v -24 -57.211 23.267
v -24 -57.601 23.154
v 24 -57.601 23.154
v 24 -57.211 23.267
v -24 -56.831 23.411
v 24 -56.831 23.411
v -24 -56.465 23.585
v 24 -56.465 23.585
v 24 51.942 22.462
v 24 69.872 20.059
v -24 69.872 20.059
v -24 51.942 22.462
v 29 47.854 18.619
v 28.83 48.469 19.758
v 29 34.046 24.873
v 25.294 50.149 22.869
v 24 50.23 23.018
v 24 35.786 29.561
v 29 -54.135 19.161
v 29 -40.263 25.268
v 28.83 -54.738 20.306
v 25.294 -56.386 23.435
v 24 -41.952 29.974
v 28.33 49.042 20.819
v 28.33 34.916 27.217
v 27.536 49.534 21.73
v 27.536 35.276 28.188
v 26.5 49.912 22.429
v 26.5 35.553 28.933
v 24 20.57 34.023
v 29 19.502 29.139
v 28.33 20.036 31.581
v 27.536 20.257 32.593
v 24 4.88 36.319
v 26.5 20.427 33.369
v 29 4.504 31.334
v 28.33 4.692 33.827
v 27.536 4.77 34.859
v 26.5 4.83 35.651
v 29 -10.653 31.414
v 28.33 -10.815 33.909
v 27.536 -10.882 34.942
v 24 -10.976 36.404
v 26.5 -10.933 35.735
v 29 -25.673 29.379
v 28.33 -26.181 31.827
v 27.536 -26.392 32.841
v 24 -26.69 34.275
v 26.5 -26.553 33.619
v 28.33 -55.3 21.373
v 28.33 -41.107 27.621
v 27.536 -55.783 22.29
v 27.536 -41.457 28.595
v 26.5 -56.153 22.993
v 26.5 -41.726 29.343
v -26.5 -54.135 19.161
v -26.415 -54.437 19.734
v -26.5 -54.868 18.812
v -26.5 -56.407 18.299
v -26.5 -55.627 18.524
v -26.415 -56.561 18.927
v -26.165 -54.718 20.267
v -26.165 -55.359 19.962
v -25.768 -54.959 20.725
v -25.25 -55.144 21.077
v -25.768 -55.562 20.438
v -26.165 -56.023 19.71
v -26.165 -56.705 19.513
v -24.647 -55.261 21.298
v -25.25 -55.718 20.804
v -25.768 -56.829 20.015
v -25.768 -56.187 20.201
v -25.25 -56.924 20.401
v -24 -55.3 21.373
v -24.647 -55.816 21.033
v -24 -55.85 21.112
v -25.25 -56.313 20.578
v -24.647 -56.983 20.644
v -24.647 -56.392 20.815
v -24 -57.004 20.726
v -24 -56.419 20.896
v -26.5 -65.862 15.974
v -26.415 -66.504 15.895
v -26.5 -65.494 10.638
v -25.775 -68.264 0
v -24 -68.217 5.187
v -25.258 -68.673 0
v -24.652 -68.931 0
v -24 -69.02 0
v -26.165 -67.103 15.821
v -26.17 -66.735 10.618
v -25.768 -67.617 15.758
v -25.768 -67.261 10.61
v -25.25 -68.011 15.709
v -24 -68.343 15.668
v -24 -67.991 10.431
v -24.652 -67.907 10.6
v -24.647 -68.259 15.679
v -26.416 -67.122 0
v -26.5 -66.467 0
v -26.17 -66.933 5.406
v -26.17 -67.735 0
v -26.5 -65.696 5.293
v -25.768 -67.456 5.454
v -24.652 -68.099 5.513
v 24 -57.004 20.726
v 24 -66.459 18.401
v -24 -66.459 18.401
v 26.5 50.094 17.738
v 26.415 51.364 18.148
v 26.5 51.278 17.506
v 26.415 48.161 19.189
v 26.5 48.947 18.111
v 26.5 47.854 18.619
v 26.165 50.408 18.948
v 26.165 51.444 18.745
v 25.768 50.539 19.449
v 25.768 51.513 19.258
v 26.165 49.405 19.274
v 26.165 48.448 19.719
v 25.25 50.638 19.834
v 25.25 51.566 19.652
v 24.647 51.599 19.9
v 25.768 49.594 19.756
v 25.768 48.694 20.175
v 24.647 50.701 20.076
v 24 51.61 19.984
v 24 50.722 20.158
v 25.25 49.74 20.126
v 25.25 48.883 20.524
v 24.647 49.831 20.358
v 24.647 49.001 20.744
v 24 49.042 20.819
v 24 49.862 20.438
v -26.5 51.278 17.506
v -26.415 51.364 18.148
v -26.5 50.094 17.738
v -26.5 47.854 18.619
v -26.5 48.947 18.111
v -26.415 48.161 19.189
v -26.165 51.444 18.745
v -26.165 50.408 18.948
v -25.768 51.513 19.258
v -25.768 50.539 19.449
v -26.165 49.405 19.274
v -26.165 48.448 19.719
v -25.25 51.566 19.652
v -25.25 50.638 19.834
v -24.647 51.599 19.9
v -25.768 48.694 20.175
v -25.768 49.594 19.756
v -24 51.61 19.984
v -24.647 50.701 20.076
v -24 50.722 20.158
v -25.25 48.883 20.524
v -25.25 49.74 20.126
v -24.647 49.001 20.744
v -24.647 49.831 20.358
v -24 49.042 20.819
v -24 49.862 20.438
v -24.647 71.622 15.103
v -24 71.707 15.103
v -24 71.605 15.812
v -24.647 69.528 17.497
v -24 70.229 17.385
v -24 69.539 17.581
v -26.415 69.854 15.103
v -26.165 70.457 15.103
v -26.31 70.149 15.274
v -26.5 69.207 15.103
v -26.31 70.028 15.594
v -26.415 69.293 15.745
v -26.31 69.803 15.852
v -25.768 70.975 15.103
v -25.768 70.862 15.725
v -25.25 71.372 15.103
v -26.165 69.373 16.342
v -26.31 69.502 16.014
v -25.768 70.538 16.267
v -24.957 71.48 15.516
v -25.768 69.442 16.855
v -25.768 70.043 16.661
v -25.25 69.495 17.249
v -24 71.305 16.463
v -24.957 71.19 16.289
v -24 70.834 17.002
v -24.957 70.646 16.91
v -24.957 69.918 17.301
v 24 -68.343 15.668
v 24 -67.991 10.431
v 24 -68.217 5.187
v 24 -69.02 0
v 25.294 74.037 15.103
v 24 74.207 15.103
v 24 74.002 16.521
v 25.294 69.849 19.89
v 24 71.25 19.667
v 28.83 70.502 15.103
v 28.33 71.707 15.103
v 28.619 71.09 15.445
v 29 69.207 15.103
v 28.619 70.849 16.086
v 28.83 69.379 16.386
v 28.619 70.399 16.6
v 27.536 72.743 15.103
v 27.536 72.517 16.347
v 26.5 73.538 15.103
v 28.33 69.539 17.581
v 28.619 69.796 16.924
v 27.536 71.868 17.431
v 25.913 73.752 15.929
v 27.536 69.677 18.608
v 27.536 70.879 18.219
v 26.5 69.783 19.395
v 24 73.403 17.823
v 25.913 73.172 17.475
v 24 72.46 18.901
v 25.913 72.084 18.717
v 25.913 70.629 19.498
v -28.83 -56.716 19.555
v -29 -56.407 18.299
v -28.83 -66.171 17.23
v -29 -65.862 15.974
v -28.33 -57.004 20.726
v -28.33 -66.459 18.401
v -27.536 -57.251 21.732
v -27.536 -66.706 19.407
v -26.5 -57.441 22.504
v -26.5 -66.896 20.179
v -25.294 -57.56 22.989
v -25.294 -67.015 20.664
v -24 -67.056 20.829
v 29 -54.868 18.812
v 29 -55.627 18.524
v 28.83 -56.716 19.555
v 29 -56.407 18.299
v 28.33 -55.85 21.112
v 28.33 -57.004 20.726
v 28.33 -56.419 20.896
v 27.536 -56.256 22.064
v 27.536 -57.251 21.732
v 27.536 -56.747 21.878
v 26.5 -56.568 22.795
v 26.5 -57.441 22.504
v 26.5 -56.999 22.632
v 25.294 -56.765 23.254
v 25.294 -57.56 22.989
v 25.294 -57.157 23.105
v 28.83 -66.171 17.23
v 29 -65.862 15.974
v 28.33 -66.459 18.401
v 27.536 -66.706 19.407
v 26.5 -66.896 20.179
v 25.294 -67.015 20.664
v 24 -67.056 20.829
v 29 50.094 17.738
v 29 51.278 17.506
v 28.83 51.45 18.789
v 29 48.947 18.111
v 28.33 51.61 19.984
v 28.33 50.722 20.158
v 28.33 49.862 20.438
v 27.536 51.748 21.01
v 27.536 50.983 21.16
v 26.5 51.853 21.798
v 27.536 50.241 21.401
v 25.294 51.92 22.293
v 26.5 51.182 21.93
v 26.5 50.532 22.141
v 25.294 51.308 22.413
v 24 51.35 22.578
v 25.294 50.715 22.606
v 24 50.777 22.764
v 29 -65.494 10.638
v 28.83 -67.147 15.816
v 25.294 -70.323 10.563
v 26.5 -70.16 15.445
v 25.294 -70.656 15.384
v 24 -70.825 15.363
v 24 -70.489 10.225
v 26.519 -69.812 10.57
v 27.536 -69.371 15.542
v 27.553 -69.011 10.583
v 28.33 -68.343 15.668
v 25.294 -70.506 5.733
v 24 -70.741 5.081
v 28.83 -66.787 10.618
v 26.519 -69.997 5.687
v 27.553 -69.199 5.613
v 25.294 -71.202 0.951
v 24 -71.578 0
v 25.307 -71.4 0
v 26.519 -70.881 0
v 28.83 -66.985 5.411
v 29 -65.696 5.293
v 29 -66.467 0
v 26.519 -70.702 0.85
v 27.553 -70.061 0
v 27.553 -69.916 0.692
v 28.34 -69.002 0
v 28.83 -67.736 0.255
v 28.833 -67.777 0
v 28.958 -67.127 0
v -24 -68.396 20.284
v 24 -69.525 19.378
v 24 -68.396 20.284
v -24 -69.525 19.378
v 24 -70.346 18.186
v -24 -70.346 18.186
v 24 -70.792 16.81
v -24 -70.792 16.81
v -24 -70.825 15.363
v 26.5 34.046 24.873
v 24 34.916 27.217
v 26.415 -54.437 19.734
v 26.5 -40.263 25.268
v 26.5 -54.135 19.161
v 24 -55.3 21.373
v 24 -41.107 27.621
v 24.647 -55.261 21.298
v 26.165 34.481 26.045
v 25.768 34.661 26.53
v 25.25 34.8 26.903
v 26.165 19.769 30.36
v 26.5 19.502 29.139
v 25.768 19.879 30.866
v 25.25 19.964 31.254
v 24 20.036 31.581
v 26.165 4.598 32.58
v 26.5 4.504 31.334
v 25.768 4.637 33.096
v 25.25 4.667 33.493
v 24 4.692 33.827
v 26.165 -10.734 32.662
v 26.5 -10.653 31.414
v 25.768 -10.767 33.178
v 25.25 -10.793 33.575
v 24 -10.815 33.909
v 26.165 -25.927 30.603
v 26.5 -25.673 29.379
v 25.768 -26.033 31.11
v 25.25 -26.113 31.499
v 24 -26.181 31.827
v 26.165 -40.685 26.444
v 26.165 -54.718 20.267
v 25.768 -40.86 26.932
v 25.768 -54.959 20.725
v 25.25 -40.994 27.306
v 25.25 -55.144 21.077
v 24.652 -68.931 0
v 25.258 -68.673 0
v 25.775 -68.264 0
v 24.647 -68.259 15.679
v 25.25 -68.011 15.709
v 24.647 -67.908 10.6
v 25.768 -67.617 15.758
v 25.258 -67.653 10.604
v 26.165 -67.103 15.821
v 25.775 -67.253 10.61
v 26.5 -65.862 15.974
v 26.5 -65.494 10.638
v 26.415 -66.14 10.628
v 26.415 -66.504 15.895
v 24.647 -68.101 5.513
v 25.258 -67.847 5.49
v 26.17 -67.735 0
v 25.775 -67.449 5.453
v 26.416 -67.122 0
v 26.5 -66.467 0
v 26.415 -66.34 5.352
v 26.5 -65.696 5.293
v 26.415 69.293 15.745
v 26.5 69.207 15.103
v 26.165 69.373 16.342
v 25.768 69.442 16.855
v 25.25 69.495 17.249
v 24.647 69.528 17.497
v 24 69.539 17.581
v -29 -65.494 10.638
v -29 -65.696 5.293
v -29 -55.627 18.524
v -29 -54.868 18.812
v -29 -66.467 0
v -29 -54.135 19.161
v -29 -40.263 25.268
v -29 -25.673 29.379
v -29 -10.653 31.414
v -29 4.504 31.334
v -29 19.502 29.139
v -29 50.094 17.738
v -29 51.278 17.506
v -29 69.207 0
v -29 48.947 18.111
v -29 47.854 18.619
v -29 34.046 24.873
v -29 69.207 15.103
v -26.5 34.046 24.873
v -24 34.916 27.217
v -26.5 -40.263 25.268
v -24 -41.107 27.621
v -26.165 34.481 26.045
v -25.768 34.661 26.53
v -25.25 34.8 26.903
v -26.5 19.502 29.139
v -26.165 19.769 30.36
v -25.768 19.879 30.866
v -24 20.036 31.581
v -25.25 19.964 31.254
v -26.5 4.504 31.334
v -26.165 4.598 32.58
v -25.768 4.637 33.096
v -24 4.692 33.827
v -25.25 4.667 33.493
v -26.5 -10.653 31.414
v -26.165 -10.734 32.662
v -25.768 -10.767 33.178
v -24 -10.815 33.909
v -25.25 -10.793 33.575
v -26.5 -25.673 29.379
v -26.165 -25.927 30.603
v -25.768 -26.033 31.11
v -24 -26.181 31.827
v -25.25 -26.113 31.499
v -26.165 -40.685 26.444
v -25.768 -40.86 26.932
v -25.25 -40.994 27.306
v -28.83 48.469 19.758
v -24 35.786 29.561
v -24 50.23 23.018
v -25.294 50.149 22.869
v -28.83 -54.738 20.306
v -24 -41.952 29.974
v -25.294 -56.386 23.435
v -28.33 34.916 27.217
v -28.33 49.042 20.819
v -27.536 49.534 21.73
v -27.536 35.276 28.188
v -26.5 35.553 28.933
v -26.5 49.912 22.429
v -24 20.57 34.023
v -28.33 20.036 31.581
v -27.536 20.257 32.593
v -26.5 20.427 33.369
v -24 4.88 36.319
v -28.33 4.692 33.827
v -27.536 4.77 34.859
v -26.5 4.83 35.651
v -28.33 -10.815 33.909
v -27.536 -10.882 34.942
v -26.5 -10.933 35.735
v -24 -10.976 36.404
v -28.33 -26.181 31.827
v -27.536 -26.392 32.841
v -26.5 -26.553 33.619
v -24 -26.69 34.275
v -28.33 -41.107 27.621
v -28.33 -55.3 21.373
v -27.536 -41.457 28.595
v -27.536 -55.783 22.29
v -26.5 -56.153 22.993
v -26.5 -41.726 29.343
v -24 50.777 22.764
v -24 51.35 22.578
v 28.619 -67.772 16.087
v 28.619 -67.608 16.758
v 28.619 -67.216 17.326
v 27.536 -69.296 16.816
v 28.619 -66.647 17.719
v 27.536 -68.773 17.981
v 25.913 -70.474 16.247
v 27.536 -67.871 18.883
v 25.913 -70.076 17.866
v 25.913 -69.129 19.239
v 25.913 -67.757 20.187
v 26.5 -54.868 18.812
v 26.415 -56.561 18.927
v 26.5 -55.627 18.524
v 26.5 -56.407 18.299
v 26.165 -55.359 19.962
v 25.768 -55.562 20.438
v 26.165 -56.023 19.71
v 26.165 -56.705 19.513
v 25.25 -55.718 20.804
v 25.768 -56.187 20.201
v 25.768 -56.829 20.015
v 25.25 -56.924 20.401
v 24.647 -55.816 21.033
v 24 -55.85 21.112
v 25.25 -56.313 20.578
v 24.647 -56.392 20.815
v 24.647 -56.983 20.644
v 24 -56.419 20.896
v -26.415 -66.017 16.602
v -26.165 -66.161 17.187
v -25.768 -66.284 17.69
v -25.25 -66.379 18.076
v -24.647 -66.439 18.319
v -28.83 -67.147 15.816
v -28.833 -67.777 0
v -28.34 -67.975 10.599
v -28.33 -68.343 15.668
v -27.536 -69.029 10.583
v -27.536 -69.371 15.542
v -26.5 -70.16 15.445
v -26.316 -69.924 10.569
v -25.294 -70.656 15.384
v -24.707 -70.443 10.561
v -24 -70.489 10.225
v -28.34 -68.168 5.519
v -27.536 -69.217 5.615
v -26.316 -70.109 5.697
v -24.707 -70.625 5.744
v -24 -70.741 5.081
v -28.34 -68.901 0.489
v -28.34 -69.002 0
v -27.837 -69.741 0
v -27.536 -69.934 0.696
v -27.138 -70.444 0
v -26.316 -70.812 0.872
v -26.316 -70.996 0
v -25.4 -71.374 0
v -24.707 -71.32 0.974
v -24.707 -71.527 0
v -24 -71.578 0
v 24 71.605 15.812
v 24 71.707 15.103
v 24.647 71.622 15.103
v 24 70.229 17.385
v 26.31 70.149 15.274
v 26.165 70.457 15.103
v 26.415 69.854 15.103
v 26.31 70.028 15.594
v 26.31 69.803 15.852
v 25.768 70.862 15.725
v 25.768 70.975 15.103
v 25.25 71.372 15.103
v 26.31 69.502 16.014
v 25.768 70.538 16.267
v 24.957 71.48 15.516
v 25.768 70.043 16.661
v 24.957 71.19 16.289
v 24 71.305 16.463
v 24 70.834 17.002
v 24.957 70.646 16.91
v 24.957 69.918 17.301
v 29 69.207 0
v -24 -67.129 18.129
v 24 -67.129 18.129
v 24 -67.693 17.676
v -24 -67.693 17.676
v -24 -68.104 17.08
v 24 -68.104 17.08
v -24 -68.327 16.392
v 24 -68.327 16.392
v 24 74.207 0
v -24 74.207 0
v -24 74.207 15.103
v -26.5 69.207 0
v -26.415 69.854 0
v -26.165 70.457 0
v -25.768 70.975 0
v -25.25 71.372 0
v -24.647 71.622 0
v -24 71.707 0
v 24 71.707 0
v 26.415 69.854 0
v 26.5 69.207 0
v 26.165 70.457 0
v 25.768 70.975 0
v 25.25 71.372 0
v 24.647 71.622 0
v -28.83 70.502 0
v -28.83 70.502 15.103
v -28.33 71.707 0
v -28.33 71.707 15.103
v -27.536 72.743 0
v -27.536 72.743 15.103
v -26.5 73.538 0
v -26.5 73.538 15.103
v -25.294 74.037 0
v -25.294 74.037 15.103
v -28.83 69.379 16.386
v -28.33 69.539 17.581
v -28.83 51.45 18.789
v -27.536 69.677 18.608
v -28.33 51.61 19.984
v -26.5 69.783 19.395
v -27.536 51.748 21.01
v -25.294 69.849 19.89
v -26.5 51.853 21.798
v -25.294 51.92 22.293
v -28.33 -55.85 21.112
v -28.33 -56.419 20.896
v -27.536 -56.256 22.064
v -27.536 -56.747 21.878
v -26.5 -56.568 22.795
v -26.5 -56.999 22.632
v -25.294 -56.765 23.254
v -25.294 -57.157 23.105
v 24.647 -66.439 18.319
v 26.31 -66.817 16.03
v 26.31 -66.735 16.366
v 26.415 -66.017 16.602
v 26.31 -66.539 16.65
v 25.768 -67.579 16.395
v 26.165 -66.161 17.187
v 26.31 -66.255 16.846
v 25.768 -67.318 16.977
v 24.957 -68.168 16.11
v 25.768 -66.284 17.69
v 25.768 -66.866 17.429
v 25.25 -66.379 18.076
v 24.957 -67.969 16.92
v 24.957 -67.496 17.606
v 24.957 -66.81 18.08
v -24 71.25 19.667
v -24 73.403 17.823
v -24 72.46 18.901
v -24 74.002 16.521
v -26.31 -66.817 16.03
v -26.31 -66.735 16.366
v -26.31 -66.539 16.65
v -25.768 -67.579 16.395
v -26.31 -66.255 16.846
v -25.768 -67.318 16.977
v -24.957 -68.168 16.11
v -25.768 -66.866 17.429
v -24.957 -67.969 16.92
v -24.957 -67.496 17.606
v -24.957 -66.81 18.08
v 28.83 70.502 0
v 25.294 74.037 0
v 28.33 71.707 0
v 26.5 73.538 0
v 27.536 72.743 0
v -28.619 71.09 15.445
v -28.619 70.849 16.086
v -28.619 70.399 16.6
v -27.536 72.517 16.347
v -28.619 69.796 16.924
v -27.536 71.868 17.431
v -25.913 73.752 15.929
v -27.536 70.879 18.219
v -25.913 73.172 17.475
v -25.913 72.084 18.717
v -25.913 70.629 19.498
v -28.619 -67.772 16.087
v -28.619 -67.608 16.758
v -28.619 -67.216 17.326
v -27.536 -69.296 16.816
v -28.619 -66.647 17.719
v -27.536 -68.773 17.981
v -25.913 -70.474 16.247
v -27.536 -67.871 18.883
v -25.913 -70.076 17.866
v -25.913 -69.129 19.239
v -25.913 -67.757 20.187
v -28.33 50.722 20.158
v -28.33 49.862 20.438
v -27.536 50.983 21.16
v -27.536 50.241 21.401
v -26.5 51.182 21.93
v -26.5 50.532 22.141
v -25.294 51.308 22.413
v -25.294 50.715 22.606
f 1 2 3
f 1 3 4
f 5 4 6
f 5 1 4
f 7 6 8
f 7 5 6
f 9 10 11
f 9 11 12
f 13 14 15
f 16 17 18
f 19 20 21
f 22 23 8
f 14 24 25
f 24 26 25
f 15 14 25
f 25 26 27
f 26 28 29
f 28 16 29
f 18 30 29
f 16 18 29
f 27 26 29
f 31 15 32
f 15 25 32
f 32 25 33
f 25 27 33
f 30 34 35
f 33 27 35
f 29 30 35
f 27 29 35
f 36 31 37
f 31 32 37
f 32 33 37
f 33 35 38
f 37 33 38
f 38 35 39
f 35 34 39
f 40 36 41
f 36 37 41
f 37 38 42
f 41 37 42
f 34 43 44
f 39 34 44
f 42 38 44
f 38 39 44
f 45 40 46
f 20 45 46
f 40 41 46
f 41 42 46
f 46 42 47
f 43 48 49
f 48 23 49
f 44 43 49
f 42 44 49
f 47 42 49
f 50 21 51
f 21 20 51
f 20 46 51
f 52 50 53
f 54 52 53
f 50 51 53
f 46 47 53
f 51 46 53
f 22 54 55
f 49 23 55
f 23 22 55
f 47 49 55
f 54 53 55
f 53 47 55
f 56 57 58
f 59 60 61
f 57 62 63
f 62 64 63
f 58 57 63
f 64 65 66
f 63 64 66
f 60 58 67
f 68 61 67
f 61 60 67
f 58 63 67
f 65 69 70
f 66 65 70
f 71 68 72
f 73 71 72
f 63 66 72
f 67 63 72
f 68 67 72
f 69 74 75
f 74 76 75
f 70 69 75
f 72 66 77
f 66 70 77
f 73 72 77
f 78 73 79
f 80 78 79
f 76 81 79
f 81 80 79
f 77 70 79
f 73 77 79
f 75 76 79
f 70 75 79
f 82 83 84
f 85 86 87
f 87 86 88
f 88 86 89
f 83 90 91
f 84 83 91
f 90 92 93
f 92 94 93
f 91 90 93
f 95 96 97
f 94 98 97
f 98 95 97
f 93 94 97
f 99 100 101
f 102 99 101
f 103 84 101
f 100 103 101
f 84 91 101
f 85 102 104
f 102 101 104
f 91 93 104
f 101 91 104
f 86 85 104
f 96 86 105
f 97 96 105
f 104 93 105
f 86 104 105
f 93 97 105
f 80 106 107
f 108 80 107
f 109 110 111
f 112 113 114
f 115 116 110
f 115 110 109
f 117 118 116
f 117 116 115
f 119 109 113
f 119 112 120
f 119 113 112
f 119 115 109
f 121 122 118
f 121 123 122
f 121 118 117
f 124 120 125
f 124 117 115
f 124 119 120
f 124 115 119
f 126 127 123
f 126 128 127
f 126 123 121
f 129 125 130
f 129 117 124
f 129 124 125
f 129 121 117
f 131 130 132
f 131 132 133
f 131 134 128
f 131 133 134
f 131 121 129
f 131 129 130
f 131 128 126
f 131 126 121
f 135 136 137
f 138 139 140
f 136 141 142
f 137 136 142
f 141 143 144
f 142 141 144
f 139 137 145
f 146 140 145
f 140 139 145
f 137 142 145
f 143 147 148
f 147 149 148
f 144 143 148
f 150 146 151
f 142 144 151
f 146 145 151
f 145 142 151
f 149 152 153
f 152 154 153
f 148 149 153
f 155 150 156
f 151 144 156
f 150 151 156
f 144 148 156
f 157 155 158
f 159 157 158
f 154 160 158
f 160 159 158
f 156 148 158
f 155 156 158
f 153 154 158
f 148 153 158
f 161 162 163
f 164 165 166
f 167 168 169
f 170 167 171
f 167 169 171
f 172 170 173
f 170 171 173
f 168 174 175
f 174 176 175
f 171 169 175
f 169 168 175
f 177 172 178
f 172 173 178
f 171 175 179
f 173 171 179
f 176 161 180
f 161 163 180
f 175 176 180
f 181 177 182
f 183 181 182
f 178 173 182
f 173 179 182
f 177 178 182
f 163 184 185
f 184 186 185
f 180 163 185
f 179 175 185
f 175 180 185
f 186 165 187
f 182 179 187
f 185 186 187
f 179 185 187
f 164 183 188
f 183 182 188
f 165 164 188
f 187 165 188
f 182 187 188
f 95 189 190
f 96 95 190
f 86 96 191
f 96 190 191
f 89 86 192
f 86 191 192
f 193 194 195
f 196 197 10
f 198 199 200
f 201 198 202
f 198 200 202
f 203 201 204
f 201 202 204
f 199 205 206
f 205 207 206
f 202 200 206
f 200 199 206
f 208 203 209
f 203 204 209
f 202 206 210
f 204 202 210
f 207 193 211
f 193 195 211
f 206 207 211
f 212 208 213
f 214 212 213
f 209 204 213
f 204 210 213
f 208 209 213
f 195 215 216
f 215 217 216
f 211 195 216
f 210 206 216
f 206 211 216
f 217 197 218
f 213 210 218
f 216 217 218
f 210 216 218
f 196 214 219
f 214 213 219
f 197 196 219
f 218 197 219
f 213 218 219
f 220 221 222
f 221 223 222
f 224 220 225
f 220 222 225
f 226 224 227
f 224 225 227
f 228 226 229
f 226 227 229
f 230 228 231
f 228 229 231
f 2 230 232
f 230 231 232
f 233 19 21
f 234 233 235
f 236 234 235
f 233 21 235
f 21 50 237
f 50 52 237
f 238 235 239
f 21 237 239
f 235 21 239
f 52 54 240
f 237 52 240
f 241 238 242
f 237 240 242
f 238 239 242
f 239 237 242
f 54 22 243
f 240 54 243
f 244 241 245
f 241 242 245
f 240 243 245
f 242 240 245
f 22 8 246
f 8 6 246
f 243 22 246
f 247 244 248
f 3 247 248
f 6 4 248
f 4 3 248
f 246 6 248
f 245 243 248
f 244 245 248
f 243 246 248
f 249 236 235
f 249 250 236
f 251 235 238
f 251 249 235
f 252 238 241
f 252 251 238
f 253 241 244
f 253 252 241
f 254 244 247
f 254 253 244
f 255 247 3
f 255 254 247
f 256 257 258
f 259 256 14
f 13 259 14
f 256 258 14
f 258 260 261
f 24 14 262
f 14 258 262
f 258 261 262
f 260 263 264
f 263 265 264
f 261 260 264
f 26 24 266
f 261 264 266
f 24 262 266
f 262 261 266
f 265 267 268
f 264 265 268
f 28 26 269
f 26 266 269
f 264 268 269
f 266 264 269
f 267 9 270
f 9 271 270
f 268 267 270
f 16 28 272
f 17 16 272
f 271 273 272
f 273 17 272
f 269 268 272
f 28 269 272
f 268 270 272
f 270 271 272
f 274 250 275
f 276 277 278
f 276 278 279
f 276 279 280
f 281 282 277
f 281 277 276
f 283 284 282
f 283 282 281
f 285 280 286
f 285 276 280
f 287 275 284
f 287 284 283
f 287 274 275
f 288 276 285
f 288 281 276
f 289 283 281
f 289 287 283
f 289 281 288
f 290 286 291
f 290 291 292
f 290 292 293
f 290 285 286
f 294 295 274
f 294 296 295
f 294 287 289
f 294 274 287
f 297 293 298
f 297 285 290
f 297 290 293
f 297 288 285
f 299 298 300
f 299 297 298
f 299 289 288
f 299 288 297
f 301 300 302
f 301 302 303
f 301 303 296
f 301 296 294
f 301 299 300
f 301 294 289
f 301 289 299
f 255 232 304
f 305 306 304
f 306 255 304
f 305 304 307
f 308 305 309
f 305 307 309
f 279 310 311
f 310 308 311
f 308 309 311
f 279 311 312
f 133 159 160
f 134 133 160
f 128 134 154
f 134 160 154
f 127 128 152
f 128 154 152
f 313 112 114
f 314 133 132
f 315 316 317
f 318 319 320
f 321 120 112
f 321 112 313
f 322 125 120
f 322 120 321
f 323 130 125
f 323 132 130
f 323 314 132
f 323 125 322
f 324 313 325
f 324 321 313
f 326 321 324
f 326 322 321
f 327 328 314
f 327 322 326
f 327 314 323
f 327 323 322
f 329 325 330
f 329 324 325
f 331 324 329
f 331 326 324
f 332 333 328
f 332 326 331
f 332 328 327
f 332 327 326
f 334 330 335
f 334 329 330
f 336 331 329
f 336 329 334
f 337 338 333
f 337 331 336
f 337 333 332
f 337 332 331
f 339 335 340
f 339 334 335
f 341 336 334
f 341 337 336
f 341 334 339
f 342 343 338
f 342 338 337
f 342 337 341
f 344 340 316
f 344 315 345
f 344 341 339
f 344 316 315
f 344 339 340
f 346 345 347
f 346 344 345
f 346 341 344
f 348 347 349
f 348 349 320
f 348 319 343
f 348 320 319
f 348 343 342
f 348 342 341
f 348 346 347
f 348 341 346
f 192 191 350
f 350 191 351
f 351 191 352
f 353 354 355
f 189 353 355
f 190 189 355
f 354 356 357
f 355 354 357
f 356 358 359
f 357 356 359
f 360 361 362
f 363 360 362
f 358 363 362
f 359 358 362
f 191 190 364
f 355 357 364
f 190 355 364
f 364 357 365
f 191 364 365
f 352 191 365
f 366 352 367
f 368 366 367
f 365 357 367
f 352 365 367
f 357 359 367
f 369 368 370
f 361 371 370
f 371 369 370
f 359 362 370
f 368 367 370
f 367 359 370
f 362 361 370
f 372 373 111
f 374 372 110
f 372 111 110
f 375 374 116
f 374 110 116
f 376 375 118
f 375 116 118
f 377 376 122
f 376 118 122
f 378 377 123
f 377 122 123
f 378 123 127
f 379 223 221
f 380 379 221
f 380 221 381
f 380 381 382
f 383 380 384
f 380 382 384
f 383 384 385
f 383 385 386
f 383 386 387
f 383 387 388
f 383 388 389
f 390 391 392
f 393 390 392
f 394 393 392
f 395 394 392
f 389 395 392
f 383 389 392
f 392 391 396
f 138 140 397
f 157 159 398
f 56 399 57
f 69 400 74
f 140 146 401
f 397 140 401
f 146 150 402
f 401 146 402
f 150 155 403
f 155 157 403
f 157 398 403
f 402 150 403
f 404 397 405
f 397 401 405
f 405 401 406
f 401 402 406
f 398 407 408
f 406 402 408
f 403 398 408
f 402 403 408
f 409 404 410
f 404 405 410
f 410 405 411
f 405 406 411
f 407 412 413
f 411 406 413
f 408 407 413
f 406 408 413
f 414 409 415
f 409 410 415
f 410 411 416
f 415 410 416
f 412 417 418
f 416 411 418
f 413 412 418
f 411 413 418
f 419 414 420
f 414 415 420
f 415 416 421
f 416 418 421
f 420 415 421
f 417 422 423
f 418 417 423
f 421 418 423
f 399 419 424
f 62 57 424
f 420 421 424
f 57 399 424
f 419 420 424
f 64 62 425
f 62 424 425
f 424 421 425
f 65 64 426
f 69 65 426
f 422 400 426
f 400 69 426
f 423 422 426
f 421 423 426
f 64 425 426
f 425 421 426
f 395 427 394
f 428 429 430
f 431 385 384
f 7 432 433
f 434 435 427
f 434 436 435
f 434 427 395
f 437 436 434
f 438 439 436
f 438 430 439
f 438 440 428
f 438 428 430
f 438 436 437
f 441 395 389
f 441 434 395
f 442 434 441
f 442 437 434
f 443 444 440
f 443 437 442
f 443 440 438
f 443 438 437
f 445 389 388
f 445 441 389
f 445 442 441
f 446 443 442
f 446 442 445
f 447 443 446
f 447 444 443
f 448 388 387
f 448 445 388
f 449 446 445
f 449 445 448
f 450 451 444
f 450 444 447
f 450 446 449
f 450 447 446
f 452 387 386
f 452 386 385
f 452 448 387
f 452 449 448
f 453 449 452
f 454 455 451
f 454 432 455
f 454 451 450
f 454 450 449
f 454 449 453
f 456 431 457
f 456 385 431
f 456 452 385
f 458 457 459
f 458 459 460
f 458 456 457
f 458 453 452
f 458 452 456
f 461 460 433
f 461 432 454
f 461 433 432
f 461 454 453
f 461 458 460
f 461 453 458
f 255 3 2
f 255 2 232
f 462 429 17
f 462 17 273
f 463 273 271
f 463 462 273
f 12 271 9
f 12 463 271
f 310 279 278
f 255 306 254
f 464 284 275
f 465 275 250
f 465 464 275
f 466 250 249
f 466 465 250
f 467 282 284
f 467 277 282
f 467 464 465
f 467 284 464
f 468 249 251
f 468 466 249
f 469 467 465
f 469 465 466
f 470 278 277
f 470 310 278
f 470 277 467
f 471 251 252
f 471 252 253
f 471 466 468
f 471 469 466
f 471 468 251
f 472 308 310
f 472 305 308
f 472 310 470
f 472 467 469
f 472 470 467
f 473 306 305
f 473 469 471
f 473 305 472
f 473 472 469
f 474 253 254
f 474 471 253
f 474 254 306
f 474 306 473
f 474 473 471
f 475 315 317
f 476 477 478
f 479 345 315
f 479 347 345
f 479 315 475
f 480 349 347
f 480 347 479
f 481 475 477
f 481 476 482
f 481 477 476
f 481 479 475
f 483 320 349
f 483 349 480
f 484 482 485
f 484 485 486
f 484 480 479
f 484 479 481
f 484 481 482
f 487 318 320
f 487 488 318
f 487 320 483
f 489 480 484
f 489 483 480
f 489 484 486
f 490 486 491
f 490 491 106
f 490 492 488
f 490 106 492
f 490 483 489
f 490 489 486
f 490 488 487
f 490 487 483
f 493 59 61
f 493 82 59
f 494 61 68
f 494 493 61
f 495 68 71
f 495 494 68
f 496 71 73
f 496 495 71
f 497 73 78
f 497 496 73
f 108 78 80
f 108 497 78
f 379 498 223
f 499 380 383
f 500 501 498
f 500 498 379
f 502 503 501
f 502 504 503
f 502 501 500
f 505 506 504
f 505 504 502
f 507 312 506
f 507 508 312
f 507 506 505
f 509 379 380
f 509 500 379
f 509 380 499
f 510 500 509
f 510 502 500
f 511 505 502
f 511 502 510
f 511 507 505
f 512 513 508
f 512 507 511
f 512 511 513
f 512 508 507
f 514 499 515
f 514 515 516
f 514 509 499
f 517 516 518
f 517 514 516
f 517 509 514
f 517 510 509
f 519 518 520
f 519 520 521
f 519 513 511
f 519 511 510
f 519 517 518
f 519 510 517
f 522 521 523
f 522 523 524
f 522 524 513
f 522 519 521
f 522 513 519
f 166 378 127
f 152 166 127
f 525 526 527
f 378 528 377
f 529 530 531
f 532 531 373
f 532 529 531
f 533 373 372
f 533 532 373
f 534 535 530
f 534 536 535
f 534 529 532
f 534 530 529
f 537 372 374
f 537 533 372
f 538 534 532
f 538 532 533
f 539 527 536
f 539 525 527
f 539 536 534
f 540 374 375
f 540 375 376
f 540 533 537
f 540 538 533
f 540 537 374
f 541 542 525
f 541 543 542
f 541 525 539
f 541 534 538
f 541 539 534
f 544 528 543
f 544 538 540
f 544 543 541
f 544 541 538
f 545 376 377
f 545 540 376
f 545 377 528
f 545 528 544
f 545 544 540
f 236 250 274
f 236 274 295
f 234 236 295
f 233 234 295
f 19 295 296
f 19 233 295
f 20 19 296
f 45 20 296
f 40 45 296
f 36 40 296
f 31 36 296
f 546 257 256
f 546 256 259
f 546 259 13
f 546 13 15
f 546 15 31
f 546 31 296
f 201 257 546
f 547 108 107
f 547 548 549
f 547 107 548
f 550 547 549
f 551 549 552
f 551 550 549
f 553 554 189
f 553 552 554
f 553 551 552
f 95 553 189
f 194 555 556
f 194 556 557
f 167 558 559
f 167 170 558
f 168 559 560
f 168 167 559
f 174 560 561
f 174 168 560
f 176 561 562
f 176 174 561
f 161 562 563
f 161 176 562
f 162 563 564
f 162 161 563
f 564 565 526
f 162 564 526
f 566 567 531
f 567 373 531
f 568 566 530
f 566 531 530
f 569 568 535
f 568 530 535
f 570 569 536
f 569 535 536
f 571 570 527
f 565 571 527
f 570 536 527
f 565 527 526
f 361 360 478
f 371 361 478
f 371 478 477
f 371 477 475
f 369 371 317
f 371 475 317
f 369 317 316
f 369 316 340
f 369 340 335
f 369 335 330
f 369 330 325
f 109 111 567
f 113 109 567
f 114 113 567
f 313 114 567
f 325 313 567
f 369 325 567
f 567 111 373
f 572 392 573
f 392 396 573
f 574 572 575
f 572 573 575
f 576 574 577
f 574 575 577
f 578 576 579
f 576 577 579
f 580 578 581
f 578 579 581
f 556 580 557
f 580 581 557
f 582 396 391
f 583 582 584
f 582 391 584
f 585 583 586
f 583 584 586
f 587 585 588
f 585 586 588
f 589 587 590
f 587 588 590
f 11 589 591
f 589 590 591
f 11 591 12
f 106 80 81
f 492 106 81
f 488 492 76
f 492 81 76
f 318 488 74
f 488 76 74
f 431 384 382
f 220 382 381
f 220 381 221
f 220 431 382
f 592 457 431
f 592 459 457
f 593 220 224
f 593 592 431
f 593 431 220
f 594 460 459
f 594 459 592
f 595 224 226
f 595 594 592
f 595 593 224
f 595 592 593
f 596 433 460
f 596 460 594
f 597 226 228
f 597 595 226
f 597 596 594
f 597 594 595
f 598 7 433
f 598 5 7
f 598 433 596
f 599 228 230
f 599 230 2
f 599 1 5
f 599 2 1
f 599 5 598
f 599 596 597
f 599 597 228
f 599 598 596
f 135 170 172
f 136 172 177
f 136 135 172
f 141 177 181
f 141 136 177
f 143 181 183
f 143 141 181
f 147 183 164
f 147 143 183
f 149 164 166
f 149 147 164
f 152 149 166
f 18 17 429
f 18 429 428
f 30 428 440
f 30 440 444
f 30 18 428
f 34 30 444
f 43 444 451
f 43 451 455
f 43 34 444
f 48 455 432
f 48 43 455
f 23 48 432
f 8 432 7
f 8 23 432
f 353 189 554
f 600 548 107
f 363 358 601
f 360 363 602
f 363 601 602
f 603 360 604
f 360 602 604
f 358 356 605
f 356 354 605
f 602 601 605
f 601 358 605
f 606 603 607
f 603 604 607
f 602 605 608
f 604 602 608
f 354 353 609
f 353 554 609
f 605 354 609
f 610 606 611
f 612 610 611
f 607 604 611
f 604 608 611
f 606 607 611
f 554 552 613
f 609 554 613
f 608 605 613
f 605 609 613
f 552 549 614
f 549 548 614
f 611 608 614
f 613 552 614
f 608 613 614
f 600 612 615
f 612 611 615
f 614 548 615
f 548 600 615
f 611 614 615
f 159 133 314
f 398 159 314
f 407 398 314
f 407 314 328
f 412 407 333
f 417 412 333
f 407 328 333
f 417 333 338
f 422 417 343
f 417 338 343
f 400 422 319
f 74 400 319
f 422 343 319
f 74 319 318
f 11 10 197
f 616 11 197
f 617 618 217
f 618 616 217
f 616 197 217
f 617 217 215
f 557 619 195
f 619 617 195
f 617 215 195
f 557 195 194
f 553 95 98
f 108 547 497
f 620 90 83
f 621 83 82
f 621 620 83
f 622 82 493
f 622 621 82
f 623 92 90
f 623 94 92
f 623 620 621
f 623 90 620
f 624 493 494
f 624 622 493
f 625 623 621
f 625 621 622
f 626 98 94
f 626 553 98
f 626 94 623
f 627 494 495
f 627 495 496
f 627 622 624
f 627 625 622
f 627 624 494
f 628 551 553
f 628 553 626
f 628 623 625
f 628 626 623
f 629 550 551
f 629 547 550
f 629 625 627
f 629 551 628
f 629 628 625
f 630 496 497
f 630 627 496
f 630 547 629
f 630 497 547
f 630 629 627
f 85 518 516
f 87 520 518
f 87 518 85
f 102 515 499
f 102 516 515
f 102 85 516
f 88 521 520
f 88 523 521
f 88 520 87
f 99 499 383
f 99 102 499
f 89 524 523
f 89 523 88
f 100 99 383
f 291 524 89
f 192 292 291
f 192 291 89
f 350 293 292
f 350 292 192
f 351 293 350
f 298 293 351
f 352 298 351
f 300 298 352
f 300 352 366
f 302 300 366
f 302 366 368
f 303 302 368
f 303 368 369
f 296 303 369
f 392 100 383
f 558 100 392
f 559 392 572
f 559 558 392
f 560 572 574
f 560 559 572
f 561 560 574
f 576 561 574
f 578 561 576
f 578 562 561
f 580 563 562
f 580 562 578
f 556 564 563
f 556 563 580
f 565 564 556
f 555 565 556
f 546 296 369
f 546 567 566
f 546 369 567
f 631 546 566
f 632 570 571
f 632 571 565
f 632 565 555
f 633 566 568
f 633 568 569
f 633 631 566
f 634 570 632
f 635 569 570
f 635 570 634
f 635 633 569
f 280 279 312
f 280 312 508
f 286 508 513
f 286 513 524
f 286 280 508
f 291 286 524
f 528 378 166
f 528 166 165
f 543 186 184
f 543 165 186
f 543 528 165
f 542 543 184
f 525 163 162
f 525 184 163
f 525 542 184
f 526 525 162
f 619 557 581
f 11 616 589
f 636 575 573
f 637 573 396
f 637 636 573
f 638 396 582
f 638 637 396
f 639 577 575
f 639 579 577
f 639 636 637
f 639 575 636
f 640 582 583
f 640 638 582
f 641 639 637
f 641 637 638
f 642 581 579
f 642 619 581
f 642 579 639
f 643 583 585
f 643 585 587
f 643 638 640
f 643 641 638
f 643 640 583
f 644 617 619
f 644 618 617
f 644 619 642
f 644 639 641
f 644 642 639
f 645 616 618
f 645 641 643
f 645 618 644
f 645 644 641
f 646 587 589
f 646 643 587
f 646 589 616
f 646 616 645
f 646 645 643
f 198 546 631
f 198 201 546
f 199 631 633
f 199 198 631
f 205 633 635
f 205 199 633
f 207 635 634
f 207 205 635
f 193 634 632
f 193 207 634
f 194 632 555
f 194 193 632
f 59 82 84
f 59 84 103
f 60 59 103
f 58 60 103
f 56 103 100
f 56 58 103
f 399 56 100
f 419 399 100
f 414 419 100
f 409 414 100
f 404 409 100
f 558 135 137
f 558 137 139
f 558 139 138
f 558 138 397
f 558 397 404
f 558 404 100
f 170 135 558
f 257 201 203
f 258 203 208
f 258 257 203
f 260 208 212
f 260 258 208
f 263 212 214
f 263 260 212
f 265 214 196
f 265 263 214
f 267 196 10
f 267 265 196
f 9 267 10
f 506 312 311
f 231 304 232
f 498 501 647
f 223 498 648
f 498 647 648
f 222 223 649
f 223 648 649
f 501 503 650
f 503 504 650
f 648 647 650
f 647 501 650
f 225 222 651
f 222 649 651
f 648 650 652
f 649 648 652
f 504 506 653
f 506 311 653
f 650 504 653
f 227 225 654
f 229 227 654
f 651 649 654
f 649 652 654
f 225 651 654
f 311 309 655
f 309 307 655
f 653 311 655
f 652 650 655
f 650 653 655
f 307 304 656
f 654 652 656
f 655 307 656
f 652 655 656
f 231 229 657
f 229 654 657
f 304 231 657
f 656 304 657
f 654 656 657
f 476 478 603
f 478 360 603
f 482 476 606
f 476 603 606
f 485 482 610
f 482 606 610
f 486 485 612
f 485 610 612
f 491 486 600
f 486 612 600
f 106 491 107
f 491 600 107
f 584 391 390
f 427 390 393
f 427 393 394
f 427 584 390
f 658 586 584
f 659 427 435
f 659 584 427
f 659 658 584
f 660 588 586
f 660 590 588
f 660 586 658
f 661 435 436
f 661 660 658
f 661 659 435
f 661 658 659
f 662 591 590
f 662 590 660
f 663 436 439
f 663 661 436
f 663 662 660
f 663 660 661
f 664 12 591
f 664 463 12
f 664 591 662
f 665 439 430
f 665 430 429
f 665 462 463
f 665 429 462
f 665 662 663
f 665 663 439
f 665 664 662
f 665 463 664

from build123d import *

# Parameters (mm, degrees)
F1_DEPTH = 29
F2_F1_R  = 5
F2_F2_R  = 5
F3_T     = -2.5


with BuildPart() as f1:
    # F0 (on Right) → F1 (new body, symmetric)
    with BuildSketch(Plane.YZ):
        with BuildLine():
            ThreePointArc((-71.5784906799, 19.7169460854), (-70.4874573475, 9.8584730427), (-71.5784906799, 0))
            Line((-71.5784906799, 0), (-54.9704477794, 0))
            ThreePointArc((-54.9704477794, 0), (-43.1382882132, 14), (-31.306128647, 0))
            Line((-31.306128647, 0), (16.2495522206, 0))
            ThreePointArc((16.2495522206, 0), (28.0817117868, 14), (39.913871353, 0))
            Line((39.913871353, 0), (74.2074146826, 0))
            Line((74.2074146826, 0), (74.2074146826, 19.4779538288))
            Line((74.2074146826, 19.4779538288), (51.0250648113, 22.5848669347))
            ThreePointArc((51.0250648113, 22.5848669347), (-2.8965217341, 36.6382547678), (-56.9998987666, 23.3018459996))
            Line((-56.9998987666, 23.3018459996), (-71.5784906799, 19.7169460854))
        make_face()
        with BuildLine():
            ThreePointArc((-31.306128647, 0), (-43.1382882132, 14), (-54.9704477794, 0))
            Line((-54.9704477794, 0), (-31.306128647, 0))
        make_face()
        with BuildLine():
            ThreePointArc((39.913871353, 0), (28.0817117868, 14), (16.2495522206, 0))
            Line((16.2495522206, 0), (39.913871353, 0))
        make_face()
    extrude(amount=F1_DEPTH, both=True)

    # F2: fillet of radius 5 on 10 edges, made by hand

    # F2_f1
    f2_f1_edges = [f1.edges().sort_by_distance(p)[0] for p in [
        (0, -56.9998987666, 23.3018459996),
        (0, 51.0250648113, 22.5848669347),
    ]]
    fillet(f2_f1_edges, radius=F2_F1_R)

    # F2_f2
    f2_f2_edges = [f1.edges().sort_by_distance(p)[0] for p in [
        (0, -71.5784906799, 19.7169460854),
        (-29, -70.4874573475, 9.8584730427),
        (29, -70.4874573475, 9.8584730427),
        (-29, -3.0466412139, 36.6391517316),
        (29, -3.0466412139, 36.6391517316),
        (0, 74.2074146826, 19.4779538288),
        (29, 74.2074146826, 9.7389769144),
        (-29, 74.2074146826, 9.7389769144),
        (29, 51.0608622621, 22.6625045572),
        (29, -57.0196487491, 23.3351165373),
        (-29, 51.0608622621, 22.6625045572),
        (-29, -57.0196487491, 23.3351165373),
    ]]
    fillet(f2_f2_edges, radius=F2_F2_R)

    # F3
    f3_openings = [f1.faces().sort_by_distance(p)[0] for p in [
        (0, 1.316584, 0),
    ]]
    offset(amount=F3_T, openings=f3_openings, kind=Kind.INTERSECTION)


solid = f1.part
